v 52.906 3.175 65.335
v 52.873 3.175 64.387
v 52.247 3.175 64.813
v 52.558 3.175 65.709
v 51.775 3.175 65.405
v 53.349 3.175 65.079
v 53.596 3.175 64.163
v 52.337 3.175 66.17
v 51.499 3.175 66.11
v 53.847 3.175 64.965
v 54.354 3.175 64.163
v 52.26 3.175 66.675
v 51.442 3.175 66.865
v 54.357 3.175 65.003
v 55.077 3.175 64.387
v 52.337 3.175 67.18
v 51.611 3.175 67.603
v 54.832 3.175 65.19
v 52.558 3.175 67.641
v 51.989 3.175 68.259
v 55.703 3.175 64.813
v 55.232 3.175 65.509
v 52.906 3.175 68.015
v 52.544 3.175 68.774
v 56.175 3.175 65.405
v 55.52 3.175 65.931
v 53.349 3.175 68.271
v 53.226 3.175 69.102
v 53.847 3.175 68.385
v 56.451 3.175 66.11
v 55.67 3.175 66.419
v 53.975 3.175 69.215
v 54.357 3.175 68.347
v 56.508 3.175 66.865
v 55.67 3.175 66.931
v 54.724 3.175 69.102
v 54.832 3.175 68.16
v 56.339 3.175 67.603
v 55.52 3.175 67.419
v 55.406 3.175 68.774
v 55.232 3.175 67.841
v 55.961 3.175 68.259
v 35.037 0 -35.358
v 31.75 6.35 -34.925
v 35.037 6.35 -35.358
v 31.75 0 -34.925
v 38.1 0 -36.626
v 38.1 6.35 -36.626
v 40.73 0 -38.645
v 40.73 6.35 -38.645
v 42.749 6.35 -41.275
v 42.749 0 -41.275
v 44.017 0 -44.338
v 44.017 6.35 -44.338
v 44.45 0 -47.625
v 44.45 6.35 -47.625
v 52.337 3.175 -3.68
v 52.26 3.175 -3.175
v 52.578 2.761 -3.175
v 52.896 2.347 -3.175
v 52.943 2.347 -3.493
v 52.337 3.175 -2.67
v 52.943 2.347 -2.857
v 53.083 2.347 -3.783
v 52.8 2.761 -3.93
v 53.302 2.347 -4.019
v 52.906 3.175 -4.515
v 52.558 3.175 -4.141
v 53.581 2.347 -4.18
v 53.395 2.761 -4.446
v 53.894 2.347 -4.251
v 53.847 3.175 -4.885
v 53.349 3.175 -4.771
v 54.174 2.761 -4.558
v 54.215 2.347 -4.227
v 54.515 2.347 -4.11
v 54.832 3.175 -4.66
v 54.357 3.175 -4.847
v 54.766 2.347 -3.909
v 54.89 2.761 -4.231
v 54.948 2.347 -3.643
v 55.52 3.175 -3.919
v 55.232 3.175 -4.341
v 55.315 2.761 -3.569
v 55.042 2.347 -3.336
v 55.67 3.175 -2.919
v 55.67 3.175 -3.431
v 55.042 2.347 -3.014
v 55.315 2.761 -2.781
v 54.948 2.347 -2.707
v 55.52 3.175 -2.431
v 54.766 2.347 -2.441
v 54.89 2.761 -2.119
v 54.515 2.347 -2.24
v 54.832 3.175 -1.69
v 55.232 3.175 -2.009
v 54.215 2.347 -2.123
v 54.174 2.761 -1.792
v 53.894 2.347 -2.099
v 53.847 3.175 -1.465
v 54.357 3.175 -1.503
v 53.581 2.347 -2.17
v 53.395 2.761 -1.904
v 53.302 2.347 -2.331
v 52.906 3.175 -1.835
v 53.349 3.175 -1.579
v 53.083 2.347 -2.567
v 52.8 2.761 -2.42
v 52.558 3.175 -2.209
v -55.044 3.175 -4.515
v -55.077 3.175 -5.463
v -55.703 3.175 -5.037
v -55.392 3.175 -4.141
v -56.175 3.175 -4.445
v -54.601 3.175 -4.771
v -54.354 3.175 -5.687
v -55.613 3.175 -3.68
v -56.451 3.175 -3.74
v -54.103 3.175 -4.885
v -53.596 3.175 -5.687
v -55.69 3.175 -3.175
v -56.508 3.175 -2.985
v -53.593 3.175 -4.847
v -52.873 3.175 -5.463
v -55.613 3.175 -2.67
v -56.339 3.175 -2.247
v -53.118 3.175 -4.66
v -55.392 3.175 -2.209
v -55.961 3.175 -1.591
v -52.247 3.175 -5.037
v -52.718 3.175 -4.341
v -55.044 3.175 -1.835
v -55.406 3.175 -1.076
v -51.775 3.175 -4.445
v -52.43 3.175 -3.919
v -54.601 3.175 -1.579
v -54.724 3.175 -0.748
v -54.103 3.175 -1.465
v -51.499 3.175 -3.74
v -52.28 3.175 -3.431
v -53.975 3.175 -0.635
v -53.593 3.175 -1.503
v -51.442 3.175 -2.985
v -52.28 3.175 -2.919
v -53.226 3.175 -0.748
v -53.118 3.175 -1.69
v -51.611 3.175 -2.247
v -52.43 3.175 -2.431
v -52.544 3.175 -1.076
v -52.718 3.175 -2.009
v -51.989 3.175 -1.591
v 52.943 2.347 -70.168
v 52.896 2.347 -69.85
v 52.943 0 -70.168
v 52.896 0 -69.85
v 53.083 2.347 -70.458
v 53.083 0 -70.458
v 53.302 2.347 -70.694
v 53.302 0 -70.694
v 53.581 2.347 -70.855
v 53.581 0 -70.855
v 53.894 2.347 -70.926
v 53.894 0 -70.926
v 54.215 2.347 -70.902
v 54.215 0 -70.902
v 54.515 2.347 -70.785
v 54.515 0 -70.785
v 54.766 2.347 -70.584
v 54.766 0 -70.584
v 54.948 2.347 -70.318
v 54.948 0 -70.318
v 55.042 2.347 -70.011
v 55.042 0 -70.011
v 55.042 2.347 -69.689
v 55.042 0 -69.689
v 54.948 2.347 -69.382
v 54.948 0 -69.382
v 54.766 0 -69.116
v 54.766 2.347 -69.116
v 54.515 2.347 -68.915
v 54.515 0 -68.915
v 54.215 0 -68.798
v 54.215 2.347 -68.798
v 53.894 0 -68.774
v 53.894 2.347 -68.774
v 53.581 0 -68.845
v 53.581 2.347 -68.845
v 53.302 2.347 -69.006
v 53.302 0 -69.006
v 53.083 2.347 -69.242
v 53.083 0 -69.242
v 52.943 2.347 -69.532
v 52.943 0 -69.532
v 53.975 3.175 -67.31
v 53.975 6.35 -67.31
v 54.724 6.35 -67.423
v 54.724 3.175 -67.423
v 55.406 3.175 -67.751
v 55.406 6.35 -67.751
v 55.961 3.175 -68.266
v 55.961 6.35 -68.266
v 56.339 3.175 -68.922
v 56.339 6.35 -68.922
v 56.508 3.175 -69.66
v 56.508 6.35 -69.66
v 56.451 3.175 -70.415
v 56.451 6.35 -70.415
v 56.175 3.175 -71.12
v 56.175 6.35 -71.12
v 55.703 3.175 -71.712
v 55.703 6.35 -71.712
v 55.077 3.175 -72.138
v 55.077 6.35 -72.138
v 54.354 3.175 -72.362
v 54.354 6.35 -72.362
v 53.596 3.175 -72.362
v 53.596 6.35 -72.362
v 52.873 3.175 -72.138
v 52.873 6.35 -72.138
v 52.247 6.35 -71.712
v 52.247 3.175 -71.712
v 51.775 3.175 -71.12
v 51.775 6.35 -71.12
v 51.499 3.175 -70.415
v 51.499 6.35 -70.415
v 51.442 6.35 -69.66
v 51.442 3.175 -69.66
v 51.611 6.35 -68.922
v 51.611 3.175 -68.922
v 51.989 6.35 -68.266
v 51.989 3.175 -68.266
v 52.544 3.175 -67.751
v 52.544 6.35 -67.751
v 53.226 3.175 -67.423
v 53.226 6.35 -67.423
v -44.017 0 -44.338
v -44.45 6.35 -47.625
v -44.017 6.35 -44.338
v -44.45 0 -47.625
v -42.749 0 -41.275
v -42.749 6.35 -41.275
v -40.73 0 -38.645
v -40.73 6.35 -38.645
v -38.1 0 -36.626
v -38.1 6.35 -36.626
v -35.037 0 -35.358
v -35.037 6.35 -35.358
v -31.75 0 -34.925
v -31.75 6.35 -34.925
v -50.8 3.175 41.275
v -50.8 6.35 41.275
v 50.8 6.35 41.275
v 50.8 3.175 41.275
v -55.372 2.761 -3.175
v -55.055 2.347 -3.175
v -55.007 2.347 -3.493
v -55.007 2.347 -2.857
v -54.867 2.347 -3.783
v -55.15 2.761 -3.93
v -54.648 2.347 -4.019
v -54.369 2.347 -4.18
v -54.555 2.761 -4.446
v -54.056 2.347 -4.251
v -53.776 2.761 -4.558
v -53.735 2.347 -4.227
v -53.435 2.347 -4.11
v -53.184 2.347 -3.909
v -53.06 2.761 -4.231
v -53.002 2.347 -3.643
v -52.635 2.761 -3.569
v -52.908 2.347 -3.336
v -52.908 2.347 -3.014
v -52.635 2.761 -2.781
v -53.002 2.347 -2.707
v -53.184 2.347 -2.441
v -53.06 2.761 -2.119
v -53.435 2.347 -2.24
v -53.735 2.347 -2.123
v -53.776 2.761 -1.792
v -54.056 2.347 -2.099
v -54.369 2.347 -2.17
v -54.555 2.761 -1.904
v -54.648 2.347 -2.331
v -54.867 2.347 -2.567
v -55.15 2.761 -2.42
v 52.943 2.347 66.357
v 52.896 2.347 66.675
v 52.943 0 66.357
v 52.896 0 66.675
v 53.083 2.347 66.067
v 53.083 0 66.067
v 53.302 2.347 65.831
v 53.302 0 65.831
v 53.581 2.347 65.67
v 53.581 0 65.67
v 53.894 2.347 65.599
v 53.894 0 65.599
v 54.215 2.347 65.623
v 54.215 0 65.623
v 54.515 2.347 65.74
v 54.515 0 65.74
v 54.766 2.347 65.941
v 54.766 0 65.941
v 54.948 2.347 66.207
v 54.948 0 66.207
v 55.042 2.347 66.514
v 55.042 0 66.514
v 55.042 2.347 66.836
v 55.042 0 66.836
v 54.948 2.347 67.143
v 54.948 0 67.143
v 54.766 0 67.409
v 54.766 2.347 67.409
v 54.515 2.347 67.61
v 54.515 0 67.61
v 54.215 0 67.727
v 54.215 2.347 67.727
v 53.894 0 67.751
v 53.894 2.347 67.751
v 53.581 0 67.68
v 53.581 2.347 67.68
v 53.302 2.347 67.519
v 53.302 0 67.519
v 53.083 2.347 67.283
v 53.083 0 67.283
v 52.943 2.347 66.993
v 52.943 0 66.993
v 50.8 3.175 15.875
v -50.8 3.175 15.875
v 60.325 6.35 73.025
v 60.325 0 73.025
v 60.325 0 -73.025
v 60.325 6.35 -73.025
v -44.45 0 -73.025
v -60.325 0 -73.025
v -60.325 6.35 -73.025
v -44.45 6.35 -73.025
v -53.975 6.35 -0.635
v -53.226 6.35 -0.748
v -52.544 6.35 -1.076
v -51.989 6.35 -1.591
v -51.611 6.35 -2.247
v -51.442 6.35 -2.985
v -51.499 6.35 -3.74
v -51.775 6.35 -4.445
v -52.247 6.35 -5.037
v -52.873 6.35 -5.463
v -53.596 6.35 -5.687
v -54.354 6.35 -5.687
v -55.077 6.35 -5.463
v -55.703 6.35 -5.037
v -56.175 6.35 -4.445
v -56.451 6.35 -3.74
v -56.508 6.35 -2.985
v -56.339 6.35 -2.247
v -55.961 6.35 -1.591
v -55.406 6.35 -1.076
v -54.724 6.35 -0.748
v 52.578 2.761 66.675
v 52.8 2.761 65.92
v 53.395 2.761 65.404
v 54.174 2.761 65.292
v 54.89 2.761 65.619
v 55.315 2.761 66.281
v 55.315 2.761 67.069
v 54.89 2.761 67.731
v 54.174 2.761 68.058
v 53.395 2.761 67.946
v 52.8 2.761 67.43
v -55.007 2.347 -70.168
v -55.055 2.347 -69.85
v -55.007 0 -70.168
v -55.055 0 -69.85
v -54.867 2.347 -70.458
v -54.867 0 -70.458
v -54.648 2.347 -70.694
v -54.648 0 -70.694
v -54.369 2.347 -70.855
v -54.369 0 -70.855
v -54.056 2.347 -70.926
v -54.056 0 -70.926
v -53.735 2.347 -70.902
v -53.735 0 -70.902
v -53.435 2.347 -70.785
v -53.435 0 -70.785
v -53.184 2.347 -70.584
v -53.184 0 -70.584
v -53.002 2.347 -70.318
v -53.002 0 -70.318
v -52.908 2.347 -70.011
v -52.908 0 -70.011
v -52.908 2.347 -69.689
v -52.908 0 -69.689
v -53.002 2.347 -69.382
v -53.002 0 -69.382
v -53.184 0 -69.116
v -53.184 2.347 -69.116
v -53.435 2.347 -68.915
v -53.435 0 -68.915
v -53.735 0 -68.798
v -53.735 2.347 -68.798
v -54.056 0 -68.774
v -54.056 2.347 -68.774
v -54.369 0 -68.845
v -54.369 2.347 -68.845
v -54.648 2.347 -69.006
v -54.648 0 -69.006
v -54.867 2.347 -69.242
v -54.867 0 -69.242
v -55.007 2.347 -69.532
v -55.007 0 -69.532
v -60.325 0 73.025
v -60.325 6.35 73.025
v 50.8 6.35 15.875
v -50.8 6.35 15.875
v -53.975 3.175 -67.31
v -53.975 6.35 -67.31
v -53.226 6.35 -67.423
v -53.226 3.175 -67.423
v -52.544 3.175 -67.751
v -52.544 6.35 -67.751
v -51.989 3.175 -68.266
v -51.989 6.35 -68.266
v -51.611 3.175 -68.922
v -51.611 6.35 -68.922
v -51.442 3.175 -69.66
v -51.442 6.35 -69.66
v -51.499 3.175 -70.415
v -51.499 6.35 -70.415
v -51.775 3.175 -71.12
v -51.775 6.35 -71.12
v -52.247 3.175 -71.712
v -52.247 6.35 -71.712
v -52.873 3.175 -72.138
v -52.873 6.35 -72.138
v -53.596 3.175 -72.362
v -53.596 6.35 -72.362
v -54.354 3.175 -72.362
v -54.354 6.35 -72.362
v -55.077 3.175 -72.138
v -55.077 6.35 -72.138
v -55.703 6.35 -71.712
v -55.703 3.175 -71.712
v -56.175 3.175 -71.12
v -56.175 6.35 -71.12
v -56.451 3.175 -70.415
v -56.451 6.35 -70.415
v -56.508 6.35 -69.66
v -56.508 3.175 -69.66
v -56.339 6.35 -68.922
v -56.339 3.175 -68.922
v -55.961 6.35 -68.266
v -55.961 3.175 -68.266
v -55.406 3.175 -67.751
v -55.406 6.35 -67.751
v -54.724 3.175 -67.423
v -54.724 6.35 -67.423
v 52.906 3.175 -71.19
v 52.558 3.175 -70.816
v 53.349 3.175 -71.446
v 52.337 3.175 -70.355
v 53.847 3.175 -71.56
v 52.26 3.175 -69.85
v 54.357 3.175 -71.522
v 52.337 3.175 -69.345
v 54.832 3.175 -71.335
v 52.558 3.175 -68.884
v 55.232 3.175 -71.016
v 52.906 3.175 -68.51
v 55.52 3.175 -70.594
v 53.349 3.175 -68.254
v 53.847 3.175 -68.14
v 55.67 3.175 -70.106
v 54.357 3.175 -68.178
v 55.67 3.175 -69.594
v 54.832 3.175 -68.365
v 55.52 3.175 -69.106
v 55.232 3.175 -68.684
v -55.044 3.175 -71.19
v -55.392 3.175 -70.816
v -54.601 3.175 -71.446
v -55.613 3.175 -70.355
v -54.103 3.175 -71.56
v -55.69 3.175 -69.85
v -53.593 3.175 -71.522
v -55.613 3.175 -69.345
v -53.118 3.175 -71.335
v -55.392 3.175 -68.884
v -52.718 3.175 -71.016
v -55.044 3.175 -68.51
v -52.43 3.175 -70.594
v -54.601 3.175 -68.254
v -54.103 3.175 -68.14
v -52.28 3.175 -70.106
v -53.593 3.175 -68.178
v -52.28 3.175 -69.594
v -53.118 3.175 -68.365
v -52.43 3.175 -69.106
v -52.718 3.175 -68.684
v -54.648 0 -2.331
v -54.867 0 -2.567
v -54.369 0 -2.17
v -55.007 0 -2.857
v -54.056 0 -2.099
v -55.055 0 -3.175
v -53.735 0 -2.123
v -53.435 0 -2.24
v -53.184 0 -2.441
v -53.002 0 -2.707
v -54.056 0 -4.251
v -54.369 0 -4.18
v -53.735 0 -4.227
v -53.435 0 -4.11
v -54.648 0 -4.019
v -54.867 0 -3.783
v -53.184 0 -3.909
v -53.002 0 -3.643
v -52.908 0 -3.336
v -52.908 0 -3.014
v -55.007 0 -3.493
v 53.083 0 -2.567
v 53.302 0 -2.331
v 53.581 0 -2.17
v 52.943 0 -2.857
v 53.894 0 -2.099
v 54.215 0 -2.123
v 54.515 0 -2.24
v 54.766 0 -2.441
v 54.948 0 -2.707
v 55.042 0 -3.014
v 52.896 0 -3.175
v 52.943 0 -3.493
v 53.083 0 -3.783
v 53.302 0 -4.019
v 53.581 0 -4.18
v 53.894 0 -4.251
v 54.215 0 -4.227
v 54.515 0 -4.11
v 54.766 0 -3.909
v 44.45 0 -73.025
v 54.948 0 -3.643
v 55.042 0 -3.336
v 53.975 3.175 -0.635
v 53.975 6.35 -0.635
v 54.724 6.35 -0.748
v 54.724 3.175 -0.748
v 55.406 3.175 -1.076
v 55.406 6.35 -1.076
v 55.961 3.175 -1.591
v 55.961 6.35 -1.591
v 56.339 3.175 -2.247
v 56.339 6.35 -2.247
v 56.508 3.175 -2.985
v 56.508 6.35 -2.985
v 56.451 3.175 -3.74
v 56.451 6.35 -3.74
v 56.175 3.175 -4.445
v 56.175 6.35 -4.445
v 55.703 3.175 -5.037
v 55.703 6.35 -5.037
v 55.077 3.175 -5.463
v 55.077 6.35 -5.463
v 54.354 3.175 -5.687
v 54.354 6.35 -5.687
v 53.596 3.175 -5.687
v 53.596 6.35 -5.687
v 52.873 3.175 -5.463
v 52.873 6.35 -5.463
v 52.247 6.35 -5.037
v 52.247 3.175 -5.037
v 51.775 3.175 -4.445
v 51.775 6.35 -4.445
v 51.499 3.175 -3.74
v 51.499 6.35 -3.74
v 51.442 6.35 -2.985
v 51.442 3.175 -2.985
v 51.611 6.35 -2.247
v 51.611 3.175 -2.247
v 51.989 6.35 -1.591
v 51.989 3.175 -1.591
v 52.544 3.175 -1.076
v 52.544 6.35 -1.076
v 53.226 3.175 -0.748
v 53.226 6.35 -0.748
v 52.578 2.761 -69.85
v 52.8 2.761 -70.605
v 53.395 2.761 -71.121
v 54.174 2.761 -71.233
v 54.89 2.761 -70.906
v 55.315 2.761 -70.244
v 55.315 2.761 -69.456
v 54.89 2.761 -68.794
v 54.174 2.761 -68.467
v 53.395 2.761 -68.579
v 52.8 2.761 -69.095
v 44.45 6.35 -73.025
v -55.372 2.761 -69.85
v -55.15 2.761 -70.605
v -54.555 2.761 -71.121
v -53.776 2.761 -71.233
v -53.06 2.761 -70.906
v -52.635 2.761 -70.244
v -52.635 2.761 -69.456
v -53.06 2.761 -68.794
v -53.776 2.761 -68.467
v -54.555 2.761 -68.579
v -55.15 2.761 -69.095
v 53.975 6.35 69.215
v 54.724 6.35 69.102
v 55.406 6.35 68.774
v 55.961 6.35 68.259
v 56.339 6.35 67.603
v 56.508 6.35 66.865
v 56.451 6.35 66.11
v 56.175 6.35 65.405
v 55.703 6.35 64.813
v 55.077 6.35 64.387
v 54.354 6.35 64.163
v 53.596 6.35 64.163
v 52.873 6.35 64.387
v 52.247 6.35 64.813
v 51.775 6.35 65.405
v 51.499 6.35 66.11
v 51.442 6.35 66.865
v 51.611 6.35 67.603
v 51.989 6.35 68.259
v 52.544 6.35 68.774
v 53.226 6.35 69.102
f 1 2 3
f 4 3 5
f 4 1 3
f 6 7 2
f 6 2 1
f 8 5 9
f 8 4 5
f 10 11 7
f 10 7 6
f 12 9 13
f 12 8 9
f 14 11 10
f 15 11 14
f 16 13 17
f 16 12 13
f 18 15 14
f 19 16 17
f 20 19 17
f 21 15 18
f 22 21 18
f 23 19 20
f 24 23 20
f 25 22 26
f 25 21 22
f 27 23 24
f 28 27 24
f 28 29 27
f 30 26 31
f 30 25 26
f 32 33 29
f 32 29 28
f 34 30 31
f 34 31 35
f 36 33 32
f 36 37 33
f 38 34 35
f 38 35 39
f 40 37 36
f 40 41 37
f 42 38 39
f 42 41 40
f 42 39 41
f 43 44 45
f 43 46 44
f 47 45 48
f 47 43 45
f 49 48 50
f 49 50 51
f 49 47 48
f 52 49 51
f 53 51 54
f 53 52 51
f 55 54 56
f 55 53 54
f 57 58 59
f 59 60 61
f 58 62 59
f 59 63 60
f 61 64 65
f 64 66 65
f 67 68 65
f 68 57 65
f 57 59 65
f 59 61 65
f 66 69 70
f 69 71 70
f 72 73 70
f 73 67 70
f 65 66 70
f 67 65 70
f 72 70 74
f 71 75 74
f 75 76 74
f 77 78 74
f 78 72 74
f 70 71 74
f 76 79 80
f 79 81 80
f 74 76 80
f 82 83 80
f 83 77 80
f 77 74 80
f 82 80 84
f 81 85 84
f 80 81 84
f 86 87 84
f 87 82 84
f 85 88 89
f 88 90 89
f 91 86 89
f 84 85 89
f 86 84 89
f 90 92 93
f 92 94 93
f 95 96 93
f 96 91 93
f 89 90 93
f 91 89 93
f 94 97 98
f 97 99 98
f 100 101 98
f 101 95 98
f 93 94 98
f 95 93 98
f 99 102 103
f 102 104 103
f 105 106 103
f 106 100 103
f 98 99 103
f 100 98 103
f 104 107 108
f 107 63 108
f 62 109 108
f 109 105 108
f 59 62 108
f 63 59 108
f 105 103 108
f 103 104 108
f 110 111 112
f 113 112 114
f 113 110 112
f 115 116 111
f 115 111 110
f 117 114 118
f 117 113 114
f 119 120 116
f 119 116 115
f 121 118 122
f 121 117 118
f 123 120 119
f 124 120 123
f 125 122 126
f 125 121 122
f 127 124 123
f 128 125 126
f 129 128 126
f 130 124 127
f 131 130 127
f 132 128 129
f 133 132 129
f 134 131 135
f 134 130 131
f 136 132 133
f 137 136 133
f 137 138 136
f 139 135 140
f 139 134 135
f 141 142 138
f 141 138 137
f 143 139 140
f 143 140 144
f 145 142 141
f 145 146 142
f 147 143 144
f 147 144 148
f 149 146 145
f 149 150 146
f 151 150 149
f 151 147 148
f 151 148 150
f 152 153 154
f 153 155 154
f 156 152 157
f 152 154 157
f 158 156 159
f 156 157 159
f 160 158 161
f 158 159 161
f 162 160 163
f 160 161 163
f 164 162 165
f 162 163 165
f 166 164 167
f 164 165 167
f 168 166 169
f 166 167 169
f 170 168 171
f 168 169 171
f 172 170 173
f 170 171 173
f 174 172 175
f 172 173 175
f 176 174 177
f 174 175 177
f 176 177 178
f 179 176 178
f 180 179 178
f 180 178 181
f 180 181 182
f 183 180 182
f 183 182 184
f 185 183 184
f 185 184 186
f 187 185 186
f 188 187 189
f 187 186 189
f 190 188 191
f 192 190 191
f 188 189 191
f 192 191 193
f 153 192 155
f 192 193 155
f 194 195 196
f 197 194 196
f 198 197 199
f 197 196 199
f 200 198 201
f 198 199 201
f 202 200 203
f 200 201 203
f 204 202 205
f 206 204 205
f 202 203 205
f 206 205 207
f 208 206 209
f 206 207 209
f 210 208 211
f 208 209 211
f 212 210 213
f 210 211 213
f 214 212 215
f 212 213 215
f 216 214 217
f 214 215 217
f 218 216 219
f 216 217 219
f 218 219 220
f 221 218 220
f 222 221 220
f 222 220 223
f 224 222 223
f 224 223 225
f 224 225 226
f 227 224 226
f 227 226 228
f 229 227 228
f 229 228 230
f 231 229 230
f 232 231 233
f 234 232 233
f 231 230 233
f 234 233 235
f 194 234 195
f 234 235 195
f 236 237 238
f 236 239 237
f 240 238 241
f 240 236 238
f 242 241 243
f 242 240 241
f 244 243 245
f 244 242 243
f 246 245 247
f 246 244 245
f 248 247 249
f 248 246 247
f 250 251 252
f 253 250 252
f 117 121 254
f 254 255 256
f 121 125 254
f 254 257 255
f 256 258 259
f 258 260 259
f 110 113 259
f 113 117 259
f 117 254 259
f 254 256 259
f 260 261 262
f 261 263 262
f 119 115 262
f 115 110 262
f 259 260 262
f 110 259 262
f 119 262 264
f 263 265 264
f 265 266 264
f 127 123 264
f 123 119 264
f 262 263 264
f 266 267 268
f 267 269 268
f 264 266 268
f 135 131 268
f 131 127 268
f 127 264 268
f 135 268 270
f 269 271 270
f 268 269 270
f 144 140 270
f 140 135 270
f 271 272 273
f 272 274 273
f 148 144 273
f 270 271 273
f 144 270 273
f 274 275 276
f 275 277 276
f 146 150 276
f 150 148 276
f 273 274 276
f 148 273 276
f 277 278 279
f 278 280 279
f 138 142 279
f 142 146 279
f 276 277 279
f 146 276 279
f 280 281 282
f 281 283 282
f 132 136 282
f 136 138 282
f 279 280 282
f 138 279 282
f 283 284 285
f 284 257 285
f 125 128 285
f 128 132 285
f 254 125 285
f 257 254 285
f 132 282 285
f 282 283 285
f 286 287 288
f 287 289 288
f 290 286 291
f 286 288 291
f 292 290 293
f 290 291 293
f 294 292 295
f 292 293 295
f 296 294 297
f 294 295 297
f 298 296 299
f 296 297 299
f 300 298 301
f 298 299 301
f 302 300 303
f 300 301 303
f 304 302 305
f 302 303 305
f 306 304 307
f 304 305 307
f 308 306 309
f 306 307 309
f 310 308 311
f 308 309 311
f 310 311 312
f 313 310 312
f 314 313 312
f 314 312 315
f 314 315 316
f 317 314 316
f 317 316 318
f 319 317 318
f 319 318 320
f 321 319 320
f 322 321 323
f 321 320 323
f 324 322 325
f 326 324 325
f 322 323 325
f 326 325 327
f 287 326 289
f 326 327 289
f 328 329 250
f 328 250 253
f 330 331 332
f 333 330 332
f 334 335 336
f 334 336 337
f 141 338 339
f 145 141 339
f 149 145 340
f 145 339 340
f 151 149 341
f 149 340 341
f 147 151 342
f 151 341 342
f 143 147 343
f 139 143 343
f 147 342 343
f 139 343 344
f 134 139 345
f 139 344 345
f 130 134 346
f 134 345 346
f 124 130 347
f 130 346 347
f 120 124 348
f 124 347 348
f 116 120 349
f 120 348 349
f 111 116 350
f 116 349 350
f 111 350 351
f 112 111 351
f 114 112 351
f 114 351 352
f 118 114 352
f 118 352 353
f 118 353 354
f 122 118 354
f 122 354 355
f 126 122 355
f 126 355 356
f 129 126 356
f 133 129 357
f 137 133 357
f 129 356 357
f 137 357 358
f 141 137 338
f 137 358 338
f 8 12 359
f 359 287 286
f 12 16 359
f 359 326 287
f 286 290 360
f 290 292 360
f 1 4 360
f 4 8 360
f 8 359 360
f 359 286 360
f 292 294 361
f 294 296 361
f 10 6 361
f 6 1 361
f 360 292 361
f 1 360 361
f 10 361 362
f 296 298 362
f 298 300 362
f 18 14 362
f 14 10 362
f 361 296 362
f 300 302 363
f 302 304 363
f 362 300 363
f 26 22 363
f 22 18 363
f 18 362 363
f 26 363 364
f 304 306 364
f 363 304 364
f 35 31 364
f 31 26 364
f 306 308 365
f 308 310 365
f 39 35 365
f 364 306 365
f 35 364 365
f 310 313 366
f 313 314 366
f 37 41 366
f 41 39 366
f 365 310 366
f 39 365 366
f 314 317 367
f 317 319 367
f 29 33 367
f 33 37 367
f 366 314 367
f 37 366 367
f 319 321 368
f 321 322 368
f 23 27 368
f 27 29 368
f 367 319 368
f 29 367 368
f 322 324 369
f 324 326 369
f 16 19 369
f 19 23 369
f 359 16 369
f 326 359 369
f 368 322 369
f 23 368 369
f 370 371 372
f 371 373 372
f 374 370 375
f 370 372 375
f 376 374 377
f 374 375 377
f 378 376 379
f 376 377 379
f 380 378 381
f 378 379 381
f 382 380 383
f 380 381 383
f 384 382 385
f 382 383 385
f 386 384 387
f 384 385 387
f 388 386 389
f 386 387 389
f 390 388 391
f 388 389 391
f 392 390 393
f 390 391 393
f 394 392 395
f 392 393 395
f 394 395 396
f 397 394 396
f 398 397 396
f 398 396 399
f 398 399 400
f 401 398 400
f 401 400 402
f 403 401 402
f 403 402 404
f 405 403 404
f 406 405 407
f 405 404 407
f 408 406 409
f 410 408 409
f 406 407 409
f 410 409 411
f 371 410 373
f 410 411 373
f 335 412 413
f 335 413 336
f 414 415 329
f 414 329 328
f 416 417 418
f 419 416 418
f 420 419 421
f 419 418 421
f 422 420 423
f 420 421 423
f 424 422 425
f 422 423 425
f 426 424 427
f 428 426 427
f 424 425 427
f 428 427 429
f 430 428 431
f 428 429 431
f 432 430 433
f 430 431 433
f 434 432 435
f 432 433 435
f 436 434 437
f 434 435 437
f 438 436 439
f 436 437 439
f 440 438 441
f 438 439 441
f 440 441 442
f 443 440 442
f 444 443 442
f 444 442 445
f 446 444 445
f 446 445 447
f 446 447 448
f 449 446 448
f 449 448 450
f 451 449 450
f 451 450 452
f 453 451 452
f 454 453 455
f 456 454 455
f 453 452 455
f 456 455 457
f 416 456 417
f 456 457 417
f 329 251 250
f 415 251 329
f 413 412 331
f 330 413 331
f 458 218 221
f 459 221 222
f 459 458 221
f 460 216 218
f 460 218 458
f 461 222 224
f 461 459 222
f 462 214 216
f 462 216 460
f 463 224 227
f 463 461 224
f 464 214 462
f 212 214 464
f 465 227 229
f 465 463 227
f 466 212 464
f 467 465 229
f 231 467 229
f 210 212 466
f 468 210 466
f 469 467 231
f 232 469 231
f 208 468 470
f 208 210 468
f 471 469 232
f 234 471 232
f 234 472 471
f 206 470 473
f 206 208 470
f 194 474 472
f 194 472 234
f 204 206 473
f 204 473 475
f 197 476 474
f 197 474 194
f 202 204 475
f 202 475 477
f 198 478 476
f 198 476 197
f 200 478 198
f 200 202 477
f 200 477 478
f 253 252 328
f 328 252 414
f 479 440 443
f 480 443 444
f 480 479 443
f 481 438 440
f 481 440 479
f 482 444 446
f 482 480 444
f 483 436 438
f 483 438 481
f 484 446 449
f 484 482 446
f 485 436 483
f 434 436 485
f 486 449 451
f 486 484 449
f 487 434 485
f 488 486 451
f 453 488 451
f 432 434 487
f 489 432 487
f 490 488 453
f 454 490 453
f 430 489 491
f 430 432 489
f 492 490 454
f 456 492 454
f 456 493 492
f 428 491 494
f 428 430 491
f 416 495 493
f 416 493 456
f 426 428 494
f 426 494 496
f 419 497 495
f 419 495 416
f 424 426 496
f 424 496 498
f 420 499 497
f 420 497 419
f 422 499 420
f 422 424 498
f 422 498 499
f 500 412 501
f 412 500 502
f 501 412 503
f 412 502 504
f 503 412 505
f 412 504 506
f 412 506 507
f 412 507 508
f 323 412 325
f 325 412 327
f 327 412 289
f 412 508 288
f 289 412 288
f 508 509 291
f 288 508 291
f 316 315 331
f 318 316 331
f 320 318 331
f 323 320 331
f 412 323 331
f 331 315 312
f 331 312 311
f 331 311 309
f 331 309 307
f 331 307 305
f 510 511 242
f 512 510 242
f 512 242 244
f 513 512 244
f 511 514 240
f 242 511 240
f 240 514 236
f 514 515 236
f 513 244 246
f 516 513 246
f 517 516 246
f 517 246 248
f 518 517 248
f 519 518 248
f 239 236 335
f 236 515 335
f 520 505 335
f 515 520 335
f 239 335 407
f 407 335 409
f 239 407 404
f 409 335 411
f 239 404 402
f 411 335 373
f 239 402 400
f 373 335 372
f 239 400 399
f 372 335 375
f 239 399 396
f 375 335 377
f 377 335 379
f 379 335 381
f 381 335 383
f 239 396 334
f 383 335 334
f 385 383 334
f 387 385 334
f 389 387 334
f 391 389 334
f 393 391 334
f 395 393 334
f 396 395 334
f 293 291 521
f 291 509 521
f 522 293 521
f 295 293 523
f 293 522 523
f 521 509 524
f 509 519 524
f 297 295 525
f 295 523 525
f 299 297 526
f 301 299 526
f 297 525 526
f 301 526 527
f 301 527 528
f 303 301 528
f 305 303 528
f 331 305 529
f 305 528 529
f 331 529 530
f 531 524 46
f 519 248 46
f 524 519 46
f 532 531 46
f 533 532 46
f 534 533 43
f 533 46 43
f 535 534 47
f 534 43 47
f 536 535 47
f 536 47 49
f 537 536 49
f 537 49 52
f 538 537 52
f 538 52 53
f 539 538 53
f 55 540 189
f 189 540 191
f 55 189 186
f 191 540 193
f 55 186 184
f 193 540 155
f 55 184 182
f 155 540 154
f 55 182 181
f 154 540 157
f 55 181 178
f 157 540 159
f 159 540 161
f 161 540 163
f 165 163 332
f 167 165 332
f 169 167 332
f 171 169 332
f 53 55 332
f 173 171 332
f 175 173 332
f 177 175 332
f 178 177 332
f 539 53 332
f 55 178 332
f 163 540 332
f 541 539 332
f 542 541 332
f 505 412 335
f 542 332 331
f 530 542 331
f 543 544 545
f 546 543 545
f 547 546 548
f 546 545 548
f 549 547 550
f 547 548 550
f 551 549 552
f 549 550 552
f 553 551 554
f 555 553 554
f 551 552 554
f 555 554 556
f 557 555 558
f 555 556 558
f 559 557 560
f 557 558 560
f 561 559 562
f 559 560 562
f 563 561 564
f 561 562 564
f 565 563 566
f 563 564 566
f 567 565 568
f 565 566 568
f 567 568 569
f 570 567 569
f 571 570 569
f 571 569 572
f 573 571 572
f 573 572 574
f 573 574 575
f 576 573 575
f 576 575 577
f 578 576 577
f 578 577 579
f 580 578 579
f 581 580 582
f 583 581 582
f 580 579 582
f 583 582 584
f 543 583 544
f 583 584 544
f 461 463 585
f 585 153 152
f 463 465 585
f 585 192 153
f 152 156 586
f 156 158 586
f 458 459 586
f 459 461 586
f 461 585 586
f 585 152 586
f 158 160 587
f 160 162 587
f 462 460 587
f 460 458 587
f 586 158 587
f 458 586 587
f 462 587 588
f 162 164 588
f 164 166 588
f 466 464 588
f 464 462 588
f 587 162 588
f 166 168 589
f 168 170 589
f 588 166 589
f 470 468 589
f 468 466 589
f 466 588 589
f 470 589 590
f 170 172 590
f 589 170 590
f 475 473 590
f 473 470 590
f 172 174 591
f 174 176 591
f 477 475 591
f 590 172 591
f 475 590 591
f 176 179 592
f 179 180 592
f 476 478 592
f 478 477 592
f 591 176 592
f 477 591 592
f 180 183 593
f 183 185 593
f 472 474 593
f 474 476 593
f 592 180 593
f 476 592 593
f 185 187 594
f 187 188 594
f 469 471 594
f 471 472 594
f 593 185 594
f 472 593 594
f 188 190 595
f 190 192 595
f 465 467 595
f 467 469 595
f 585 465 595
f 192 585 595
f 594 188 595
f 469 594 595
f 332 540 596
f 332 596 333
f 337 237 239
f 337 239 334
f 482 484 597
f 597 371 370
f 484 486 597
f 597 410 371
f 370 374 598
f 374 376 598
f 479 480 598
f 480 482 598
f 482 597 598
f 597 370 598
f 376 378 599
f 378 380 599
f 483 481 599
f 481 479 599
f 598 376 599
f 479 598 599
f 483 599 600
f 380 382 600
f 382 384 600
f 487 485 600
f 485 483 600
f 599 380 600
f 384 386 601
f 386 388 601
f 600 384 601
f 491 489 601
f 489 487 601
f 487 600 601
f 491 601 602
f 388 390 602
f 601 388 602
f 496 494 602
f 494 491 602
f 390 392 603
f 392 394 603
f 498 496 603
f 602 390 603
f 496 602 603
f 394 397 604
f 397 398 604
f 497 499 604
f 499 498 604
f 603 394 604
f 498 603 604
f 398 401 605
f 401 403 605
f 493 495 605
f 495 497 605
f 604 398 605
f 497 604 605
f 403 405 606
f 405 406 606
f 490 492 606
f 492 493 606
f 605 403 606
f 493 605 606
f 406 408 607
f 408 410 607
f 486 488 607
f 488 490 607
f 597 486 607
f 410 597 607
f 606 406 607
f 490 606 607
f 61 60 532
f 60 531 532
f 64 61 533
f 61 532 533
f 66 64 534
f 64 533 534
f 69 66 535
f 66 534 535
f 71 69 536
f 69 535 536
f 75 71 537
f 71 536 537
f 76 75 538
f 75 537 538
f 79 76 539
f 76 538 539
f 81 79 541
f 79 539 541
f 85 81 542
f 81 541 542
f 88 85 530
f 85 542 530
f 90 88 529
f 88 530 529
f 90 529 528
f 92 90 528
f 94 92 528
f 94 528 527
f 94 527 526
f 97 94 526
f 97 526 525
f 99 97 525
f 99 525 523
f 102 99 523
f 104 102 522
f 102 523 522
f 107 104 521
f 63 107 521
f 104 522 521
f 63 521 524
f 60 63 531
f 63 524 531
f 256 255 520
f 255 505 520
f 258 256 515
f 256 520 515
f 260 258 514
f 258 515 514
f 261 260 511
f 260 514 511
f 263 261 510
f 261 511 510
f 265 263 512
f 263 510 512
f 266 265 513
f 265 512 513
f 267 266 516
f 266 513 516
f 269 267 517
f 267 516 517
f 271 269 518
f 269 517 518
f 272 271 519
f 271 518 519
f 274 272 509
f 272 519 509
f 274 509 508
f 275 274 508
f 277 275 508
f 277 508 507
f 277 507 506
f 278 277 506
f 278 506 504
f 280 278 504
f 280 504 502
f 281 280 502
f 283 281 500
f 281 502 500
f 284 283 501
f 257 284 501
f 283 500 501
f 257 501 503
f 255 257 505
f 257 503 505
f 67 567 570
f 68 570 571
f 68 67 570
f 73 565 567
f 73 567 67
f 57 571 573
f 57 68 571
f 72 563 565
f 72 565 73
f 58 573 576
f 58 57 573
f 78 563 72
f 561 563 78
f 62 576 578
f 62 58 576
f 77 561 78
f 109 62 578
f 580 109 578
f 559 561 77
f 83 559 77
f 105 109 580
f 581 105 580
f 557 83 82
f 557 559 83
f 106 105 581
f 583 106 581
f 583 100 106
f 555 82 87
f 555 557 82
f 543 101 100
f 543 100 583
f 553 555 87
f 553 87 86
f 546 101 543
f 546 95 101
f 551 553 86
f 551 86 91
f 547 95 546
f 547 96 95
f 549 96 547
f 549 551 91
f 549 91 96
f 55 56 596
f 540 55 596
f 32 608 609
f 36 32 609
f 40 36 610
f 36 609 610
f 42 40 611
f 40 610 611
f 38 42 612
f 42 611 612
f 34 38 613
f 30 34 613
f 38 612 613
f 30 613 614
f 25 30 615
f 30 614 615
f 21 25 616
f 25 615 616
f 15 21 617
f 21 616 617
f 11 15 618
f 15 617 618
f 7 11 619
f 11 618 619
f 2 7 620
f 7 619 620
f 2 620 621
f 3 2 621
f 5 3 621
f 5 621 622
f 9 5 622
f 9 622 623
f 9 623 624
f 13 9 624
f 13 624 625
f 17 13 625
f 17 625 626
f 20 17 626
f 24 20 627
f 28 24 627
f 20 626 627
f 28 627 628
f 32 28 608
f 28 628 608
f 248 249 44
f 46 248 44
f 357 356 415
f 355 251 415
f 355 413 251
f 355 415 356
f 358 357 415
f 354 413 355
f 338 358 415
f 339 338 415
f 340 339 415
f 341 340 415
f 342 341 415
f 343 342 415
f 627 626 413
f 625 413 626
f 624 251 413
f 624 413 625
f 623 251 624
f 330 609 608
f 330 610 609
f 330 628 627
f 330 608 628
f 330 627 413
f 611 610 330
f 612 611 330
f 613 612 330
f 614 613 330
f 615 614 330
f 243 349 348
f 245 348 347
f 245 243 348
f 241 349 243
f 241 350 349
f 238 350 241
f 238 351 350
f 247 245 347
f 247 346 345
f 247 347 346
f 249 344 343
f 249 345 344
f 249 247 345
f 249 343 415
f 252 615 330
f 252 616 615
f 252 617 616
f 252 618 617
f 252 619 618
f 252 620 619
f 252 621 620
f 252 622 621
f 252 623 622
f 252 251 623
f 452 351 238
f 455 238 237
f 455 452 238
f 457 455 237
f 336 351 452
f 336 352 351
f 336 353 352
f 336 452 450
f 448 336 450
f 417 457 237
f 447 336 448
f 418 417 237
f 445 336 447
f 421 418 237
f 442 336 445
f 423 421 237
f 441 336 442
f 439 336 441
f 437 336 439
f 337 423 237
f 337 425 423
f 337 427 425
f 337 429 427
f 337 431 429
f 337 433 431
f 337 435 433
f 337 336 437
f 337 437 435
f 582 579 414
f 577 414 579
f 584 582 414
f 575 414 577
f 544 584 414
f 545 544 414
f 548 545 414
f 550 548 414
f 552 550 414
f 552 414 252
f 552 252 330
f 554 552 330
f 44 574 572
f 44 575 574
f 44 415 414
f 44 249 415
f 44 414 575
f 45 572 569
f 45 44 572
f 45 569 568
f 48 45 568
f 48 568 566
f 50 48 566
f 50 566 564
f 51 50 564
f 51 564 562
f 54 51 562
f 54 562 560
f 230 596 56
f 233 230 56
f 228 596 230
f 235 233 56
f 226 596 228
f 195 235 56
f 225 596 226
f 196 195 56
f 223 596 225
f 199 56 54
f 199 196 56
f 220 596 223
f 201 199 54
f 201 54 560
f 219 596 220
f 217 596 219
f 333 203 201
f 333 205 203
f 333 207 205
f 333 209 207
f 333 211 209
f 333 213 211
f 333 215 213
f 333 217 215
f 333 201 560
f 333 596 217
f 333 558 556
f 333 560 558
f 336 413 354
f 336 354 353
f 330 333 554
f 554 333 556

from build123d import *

# Parameters (mm, degrees)
SKETCH1_W                       = 120.65
SKETCH1_H                       = 146.05
BOSS_EXTRUDE1_DEPTH             = 6.35
SKETCH7_R                       = 2.54
CUT_EXTRUDE1_DEPTH              = 3.175
F_2_CLEARANCE_HOLE2_D           = 2.159
F_2_CLEARANCE_HOLE2_CSINK_D     = 3.429
F_2_CLEARANCE_HOLE2_CSINK_ANGLE = 75
SKETCH13_W                      = 88.9
SKETCH13_H                      = 38.1
CUT_EXTRUDE3_DEPTH              = 95.931969062
FILLET1_R                       = 12.7
SKETCH11_W                      = 101.6
SKETCH11_H                      = 25.4
CUT_EXTRUDE2_DEPTH              = 3.175


with BuildPart() as part:
    # Sketch1 → Boss-Extrude1 (new body)
    with BuildSketch(Plane(origin=(0, 0, 0), x_dir=(1, 0, 0), z_dir=(0, 1, 0))):
        Rectangle(SKETCH1_W, SKETCH1_H)
    extrude(amount=BOSS_EXTRUDE1_DEPTH)

    # Sketch7 → Cut-Extrude1 (cut)
    with BuildSketch(Plane(origin=(0, 6.35, 0), x_dir=(1, 0, 0), z_dir=(0, 1, 0))):
        with Locations(Location((-53.975, 3.175, 0), (0, 0, 270))):
            Circle(SKETCH7_R)
        with Locations(Location((53.975, 3.175, 0), (0, 0, 270))):
            Circle(SKETCH7_R)
        with Locations(Location((53.975, -66.675, 0), (0, 0, 270))):
            Circle(SKETCH7_R)
        with Locations(Location((-53.975, 69.85, 0), (0, 0, 270))):
            Circle(SKETCH7_R)
        with Locations(Location((53.975, 69.85, 0), (0, 0, 270))):
            Circle(SKETCH7_R)
    extrude(amount=-CUT_EXTRUDE1_DEPTH, mode=Mode.SUBTRACT)

    # #2 Clearance Hole2 (through all)
    with Locations(Plane(origin=(0, 3.175, 0), x_dir=(1, 0, 0), z_dir=(0, 1, 0))):
        with Locations((-53.975, 3.175), (53.975, 3.175), (53.975, -66.675), (-53.975, 69.85), (53.975, 69.85)):
            CounterSinkHole(F_2_CLEARANCE_HOLE2_D / 2, F_2_CLEARANCE_HOLE2_CSINK_D / 2, counter_sink_angle=F_2_CLEARANCE_HOLE2_CSINK_ANGLE)

    # Sketch13 → Cut-Extrude3 (cut, through all)
    with BuildSketch(Plane(origin=(0, 6.35, 0), x_dir=(1, 0, 0), z_dir=(0, 1, 0))):
        with Locations((0, 53.975)):
            Rectangle(SKETCH13_W, SKETCH13_H)
    extrude(amount=-CUT_EXTRUDE3_DEPTH, mode=Mode.SUBTRACT)

    # Fillet1
    fillet1_edges = [part.edges().sort_by_distance(p)[0] for p in [
        (44.45, 3.175, -34.925),
        (-44.45, 3.175, -34.925),
    ]]
    fillet(fillet1_edges, radius=FILLET1_R)

    # Sketch11 → Cut-Extrude2 (cut)
    with BuildSketch(Plane(origin=(0, 6.35, 0), x_dir=(1, 0, 0), z_dir=(0, 1, 0))):
        with Locations((0, -28.575)):
            Rectangle(SKETCH11_W, SKETCH11_H)
    extrude(amount=-CUT_EXTRUDE2_DEPTH, mode=Mode.SUBTRACT)


solid = part.part
